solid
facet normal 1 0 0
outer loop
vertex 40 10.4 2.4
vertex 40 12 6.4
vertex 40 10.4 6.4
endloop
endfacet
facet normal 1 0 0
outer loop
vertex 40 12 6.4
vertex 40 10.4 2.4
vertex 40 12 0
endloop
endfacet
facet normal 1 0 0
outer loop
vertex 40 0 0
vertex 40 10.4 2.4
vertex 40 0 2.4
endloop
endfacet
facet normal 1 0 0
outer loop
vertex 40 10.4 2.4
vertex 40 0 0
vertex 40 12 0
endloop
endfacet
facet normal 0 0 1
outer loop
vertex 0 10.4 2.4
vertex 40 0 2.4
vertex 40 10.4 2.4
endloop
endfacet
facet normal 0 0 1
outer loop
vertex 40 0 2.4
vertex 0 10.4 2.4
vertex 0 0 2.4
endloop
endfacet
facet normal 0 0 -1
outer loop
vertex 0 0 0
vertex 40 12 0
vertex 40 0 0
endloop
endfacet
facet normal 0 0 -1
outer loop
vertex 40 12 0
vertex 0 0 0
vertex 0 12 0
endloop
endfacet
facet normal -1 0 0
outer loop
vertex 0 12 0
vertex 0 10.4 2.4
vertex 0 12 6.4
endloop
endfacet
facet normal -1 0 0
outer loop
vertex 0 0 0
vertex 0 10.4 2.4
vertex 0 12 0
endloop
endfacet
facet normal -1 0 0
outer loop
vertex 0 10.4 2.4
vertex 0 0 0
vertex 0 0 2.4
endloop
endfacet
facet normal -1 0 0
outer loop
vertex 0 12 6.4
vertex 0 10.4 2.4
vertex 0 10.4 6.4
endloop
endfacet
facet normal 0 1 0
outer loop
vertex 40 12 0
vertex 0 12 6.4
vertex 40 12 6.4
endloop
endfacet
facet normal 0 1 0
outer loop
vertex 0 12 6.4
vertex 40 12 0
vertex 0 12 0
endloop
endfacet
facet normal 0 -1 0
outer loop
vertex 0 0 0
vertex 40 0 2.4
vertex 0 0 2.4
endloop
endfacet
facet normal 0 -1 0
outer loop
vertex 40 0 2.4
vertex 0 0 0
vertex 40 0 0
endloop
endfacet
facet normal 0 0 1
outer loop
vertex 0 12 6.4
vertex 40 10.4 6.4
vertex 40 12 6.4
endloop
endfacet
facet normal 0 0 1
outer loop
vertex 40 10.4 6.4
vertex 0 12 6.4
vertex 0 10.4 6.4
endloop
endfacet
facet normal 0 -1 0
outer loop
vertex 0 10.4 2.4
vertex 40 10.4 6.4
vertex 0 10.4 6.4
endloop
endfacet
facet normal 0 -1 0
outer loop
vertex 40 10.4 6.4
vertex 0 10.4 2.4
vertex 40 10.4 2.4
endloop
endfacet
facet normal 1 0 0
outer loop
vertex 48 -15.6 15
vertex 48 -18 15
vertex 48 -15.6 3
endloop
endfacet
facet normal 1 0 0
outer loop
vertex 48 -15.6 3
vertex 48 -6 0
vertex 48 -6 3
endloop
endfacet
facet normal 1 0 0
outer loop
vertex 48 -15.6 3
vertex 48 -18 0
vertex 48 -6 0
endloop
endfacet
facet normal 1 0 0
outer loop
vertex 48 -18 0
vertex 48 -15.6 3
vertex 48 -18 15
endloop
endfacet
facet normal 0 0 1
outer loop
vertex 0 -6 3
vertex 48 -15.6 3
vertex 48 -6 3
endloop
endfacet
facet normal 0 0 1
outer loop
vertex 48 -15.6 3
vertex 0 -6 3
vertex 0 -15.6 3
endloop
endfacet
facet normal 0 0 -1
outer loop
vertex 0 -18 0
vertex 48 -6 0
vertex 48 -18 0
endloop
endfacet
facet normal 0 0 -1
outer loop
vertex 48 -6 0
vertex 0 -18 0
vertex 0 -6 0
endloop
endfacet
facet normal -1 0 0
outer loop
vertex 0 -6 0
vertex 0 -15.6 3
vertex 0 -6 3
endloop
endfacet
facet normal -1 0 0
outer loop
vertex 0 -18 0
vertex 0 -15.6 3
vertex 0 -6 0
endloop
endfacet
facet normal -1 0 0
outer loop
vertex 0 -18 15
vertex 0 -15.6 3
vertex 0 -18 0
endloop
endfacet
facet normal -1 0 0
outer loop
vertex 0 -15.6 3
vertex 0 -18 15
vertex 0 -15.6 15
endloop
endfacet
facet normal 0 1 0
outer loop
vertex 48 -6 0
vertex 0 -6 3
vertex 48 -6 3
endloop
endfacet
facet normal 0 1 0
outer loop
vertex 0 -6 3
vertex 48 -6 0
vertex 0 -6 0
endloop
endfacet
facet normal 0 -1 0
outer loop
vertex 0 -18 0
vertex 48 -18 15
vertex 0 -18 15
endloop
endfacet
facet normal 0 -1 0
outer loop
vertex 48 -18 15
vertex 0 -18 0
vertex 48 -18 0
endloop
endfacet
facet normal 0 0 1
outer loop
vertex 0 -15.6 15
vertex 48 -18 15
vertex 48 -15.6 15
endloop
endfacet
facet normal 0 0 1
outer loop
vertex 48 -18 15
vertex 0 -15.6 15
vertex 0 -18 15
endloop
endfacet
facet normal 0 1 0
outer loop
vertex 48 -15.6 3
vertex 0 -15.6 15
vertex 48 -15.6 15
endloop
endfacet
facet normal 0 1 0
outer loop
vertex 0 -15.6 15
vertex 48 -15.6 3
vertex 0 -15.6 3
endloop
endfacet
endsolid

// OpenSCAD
// ============================================================================
//  fit_test_lip.scad — lid-lip / base-wall slip-fit test piece (enclosure-prep2)
//  Purpose: verify the lid locating-lip tolerance (fit_clearance) and confirm
//  that the 1.6 mm lip prints cleanly, WITHOUT printing the whole 220x160 shell.
//
//  Values MUST be kept in sync with the matching parameter block at the top of
//  rough_enclosure_v1.scad.
//
//  Prints flat, no supports. Two bars are produced:
//    - lip_plate  : lid edge replica (flat plate + standing lip)
//    - slot_plate : base wall replica (floor + standing wall)
//  Assembly check on a table: press the lip OUTER face against the wall INNER
//  face. The intended gap is fit_clearance (0.35 mm): it should slide with
//  light resistance and no visible slop.
// ============================================================================

$fn = 72;

part = "both";   // "lip" | "slot" | "both"

// ---- keep in sync with rough_enclosure_v1.scad ----
lid_thickness     = 2.4;
lid_lip_height    = 4.0;
lid_lip_thickness = 1.6;
wall_thickness    = 2.4;
base_thickness    = 3.0;
fit_clearance     = 0.35;
// ------------------------------------------------

test_len    = 40;   // length of the test segment
plate_depth = 12;   // depth of the lid plate replica

// lid edge replica: plate flat on the bed, lip standing on top (print-friendly)
module lip_plate() {
  cube([test_len, plate_depth, lid_thickness]);
  translate([0, plate_depth - lid_lip_thickness, lid_thickness])
    cube([test_len, lid_lip_thickness, lid_lip_height]);
}

// base wall replica: floor flat on the bed, wall standing (print-friendly)
module slot_plate() {
  cube([test_len + 8, plate_depth, base_thickness]);
  translate([0, 0, base_thickness])
    cube([test_len + 8, wall_thickness, 12]);
}

if (part == "lip") {
  lip_plate();
} else if (part == "slot") {
  slot_plate();
} else {
  lip_plate();
  translate([0, -plate_depth - 6, 0]) slot_plate();
}
